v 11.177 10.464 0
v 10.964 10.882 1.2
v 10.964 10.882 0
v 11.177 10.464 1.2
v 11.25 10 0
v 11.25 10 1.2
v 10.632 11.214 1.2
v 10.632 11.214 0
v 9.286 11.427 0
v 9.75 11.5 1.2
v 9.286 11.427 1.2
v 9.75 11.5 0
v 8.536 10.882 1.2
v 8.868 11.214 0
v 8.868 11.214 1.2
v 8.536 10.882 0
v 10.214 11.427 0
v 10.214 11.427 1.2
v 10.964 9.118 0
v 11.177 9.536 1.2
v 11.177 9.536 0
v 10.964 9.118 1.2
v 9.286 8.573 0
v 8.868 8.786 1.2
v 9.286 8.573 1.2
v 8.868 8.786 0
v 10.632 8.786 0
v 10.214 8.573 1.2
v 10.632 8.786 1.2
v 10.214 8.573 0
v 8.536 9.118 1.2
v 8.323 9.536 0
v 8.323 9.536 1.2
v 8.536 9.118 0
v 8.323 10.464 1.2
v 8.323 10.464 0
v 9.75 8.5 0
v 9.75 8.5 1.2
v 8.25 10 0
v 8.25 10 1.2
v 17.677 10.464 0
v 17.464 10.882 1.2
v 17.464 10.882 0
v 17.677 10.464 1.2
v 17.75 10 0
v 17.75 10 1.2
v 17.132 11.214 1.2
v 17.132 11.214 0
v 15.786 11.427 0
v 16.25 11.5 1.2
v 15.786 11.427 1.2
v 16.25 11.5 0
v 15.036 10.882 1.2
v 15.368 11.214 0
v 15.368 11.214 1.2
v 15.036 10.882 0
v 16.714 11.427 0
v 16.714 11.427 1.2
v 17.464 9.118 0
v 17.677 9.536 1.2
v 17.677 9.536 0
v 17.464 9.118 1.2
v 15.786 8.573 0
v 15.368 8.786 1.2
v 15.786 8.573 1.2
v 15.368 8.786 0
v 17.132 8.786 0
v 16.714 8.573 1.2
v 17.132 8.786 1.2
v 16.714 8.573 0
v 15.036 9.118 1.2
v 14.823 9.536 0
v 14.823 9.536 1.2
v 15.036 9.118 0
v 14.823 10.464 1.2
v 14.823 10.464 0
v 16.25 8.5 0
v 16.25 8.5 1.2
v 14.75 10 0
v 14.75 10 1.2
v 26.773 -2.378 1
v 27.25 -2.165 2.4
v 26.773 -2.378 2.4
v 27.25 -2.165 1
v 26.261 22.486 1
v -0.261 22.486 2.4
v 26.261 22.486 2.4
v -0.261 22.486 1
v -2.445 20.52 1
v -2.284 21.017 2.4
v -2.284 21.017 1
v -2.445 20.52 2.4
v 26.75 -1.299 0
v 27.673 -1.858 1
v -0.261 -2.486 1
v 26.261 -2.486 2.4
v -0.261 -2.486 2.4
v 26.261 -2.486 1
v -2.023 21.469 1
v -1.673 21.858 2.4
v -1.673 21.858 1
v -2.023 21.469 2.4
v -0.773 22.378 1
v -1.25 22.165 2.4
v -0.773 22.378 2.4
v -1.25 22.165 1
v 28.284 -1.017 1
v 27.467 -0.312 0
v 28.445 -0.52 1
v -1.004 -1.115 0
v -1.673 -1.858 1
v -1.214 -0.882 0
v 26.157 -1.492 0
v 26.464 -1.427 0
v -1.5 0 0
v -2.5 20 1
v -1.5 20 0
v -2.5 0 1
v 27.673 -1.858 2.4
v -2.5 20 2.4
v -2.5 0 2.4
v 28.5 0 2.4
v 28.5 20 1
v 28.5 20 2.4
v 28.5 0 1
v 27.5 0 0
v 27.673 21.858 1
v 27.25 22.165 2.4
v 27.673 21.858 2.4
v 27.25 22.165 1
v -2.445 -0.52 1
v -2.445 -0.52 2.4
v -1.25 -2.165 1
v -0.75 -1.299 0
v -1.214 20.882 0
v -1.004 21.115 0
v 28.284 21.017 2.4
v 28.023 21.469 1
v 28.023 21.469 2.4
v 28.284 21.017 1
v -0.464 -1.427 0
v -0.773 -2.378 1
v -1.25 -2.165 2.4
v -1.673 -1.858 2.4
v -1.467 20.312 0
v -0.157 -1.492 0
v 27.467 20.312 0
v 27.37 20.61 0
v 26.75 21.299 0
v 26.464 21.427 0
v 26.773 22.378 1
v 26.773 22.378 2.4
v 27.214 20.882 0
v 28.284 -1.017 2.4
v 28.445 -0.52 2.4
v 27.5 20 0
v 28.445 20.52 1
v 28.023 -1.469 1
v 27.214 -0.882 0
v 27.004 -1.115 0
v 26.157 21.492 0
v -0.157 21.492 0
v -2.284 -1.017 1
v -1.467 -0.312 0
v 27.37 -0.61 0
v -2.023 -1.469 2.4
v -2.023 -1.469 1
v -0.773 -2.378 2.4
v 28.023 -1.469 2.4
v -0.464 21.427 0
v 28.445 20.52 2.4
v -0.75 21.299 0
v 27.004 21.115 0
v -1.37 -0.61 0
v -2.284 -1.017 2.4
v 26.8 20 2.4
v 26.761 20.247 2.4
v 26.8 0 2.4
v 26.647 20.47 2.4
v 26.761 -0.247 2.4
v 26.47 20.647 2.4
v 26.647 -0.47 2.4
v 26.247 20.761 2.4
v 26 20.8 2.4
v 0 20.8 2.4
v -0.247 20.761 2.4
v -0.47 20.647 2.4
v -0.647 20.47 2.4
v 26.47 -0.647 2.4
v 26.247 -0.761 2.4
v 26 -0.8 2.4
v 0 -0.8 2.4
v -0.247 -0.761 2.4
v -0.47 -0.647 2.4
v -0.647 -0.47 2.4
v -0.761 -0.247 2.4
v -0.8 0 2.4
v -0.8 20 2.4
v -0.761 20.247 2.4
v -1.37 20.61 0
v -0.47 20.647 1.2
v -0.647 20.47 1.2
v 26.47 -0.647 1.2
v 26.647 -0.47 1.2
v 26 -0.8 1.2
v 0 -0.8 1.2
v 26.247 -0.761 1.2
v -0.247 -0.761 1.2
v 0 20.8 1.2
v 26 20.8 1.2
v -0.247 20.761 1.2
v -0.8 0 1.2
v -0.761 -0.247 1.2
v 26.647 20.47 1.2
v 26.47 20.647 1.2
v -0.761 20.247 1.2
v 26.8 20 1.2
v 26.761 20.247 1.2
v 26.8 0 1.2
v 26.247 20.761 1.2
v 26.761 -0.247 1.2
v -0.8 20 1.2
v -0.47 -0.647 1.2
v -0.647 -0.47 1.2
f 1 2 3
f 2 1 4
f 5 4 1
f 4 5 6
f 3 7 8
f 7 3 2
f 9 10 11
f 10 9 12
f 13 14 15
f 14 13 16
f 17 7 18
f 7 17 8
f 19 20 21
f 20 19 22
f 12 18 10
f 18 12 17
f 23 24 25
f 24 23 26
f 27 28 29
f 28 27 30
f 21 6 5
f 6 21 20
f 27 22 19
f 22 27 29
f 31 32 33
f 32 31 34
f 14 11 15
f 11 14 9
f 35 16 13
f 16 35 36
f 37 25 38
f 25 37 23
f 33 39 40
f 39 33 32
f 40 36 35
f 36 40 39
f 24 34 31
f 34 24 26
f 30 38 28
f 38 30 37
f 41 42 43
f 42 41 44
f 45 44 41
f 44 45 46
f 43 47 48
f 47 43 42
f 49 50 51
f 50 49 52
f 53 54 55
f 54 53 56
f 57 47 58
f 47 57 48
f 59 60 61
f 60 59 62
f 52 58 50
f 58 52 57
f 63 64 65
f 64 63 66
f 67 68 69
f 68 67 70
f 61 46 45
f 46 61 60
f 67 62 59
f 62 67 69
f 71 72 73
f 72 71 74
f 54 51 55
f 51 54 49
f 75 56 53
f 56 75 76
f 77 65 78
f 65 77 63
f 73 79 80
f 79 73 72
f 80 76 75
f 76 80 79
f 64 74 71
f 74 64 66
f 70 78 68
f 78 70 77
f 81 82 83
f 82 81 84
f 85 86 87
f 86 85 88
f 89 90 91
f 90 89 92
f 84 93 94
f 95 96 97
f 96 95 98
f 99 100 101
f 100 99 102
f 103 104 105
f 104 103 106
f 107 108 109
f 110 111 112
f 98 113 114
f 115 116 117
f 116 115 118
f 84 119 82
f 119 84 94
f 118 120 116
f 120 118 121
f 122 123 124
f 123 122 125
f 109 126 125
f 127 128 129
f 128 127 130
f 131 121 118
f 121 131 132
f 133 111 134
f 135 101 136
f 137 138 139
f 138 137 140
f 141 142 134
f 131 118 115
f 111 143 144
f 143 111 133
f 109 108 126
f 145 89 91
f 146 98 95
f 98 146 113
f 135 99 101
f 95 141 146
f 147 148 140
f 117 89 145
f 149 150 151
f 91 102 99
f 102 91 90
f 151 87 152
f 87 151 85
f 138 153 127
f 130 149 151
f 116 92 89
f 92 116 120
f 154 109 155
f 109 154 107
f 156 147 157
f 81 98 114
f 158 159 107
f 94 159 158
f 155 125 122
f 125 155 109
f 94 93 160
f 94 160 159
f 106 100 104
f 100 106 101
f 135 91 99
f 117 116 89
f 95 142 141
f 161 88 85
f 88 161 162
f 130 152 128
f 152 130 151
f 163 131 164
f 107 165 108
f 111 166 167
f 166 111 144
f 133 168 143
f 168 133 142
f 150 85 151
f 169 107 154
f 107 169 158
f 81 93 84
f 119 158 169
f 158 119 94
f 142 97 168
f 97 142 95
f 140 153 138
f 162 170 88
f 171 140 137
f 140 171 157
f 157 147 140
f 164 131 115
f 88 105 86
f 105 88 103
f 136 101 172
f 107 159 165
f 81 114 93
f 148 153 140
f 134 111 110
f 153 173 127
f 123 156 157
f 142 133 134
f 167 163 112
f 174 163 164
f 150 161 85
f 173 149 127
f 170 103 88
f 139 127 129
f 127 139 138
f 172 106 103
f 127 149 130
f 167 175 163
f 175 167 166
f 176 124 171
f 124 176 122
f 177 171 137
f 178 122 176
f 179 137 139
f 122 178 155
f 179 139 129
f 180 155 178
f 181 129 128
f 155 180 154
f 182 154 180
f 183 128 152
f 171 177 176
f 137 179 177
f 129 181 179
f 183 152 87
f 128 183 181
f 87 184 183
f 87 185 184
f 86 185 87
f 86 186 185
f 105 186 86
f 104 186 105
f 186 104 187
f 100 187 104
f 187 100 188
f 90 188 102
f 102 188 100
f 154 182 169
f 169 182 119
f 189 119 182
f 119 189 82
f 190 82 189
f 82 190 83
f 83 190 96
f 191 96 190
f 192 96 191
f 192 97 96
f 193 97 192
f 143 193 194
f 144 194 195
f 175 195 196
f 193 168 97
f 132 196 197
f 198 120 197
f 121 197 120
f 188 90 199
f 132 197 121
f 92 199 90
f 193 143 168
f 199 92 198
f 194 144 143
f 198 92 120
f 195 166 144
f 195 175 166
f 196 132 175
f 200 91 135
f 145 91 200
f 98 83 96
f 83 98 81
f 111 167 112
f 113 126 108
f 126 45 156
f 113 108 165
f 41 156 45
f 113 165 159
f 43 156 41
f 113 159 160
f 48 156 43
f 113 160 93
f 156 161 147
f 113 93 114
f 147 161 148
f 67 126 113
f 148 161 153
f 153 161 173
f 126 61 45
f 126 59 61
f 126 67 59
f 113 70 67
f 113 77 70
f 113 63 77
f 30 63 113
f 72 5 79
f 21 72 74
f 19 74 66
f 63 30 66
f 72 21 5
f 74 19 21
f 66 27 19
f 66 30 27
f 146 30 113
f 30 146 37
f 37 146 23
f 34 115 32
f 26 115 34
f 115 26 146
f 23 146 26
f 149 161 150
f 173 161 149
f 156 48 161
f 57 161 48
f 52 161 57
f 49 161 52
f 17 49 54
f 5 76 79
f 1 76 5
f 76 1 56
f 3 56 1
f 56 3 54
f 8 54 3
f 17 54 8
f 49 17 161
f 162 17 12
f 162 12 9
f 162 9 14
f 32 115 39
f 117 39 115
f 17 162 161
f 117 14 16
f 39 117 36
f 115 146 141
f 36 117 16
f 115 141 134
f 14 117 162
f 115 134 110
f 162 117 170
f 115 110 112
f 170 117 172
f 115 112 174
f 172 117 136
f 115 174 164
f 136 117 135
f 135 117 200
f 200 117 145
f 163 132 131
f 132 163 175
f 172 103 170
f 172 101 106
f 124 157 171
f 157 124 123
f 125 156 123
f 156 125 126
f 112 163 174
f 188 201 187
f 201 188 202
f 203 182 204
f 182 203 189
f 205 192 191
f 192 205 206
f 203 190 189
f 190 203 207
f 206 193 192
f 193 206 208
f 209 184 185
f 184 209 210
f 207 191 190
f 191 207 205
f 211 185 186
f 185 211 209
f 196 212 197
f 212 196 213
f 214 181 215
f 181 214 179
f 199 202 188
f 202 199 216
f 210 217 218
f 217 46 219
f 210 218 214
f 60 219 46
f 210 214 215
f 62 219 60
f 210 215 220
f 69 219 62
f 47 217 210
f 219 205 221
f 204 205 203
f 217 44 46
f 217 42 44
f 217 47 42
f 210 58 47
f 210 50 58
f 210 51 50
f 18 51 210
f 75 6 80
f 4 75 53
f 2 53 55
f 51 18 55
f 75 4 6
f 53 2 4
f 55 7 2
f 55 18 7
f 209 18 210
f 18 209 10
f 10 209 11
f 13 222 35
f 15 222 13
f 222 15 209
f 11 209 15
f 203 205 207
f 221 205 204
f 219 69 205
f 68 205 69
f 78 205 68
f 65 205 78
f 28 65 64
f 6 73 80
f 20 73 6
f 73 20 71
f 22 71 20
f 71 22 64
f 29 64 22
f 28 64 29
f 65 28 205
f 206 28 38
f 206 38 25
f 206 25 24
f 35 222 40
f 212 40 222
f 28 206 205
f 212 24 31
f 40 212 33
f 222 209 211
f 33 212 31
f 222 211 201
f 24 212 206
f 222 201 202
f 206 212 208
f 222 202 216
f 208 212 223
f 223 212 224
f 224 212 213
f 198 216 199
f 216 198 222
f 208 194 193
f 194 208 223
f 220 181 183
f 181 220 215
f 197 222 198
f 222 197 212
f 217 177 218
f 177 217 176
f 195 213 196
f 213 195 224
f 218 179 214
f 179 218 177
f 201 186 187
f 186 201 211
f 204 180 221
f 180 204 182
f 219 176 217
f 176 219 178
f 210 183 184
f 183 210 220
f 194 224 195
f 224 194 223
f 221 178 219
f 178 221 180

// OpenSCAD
iw=26;
ih=20;
difference() {
  translate([2,2]) hull() {
    *linear_extrude(2.4,convexity=3) offset(5,$fn=40) square([iw-4,ih-4]);
    for(x=[-2,iw-2],y=[-2,ih-2]) translate([x,y]) {
      cylinder(d1=3,d2=5,h=1,$fn=30);
      translate([0,0,1]) cylinder(d=5,h=1.4,$fn=30);
    }
  }
  translate([0,0,1.2]) linear_extrude(2,convexity=3) offset(.8,$fn=20) square([iw,ih]);
  for(x=[iw*3/8,iw*5/8]) translate([x,ih/2,-.01]) cylinder(d=3,h=3.02,$fn=20);
  *translate([-10,ih/2,2.4]) rotate([0,90]) cylinder(d=2,h=10,$fn=20);
}
